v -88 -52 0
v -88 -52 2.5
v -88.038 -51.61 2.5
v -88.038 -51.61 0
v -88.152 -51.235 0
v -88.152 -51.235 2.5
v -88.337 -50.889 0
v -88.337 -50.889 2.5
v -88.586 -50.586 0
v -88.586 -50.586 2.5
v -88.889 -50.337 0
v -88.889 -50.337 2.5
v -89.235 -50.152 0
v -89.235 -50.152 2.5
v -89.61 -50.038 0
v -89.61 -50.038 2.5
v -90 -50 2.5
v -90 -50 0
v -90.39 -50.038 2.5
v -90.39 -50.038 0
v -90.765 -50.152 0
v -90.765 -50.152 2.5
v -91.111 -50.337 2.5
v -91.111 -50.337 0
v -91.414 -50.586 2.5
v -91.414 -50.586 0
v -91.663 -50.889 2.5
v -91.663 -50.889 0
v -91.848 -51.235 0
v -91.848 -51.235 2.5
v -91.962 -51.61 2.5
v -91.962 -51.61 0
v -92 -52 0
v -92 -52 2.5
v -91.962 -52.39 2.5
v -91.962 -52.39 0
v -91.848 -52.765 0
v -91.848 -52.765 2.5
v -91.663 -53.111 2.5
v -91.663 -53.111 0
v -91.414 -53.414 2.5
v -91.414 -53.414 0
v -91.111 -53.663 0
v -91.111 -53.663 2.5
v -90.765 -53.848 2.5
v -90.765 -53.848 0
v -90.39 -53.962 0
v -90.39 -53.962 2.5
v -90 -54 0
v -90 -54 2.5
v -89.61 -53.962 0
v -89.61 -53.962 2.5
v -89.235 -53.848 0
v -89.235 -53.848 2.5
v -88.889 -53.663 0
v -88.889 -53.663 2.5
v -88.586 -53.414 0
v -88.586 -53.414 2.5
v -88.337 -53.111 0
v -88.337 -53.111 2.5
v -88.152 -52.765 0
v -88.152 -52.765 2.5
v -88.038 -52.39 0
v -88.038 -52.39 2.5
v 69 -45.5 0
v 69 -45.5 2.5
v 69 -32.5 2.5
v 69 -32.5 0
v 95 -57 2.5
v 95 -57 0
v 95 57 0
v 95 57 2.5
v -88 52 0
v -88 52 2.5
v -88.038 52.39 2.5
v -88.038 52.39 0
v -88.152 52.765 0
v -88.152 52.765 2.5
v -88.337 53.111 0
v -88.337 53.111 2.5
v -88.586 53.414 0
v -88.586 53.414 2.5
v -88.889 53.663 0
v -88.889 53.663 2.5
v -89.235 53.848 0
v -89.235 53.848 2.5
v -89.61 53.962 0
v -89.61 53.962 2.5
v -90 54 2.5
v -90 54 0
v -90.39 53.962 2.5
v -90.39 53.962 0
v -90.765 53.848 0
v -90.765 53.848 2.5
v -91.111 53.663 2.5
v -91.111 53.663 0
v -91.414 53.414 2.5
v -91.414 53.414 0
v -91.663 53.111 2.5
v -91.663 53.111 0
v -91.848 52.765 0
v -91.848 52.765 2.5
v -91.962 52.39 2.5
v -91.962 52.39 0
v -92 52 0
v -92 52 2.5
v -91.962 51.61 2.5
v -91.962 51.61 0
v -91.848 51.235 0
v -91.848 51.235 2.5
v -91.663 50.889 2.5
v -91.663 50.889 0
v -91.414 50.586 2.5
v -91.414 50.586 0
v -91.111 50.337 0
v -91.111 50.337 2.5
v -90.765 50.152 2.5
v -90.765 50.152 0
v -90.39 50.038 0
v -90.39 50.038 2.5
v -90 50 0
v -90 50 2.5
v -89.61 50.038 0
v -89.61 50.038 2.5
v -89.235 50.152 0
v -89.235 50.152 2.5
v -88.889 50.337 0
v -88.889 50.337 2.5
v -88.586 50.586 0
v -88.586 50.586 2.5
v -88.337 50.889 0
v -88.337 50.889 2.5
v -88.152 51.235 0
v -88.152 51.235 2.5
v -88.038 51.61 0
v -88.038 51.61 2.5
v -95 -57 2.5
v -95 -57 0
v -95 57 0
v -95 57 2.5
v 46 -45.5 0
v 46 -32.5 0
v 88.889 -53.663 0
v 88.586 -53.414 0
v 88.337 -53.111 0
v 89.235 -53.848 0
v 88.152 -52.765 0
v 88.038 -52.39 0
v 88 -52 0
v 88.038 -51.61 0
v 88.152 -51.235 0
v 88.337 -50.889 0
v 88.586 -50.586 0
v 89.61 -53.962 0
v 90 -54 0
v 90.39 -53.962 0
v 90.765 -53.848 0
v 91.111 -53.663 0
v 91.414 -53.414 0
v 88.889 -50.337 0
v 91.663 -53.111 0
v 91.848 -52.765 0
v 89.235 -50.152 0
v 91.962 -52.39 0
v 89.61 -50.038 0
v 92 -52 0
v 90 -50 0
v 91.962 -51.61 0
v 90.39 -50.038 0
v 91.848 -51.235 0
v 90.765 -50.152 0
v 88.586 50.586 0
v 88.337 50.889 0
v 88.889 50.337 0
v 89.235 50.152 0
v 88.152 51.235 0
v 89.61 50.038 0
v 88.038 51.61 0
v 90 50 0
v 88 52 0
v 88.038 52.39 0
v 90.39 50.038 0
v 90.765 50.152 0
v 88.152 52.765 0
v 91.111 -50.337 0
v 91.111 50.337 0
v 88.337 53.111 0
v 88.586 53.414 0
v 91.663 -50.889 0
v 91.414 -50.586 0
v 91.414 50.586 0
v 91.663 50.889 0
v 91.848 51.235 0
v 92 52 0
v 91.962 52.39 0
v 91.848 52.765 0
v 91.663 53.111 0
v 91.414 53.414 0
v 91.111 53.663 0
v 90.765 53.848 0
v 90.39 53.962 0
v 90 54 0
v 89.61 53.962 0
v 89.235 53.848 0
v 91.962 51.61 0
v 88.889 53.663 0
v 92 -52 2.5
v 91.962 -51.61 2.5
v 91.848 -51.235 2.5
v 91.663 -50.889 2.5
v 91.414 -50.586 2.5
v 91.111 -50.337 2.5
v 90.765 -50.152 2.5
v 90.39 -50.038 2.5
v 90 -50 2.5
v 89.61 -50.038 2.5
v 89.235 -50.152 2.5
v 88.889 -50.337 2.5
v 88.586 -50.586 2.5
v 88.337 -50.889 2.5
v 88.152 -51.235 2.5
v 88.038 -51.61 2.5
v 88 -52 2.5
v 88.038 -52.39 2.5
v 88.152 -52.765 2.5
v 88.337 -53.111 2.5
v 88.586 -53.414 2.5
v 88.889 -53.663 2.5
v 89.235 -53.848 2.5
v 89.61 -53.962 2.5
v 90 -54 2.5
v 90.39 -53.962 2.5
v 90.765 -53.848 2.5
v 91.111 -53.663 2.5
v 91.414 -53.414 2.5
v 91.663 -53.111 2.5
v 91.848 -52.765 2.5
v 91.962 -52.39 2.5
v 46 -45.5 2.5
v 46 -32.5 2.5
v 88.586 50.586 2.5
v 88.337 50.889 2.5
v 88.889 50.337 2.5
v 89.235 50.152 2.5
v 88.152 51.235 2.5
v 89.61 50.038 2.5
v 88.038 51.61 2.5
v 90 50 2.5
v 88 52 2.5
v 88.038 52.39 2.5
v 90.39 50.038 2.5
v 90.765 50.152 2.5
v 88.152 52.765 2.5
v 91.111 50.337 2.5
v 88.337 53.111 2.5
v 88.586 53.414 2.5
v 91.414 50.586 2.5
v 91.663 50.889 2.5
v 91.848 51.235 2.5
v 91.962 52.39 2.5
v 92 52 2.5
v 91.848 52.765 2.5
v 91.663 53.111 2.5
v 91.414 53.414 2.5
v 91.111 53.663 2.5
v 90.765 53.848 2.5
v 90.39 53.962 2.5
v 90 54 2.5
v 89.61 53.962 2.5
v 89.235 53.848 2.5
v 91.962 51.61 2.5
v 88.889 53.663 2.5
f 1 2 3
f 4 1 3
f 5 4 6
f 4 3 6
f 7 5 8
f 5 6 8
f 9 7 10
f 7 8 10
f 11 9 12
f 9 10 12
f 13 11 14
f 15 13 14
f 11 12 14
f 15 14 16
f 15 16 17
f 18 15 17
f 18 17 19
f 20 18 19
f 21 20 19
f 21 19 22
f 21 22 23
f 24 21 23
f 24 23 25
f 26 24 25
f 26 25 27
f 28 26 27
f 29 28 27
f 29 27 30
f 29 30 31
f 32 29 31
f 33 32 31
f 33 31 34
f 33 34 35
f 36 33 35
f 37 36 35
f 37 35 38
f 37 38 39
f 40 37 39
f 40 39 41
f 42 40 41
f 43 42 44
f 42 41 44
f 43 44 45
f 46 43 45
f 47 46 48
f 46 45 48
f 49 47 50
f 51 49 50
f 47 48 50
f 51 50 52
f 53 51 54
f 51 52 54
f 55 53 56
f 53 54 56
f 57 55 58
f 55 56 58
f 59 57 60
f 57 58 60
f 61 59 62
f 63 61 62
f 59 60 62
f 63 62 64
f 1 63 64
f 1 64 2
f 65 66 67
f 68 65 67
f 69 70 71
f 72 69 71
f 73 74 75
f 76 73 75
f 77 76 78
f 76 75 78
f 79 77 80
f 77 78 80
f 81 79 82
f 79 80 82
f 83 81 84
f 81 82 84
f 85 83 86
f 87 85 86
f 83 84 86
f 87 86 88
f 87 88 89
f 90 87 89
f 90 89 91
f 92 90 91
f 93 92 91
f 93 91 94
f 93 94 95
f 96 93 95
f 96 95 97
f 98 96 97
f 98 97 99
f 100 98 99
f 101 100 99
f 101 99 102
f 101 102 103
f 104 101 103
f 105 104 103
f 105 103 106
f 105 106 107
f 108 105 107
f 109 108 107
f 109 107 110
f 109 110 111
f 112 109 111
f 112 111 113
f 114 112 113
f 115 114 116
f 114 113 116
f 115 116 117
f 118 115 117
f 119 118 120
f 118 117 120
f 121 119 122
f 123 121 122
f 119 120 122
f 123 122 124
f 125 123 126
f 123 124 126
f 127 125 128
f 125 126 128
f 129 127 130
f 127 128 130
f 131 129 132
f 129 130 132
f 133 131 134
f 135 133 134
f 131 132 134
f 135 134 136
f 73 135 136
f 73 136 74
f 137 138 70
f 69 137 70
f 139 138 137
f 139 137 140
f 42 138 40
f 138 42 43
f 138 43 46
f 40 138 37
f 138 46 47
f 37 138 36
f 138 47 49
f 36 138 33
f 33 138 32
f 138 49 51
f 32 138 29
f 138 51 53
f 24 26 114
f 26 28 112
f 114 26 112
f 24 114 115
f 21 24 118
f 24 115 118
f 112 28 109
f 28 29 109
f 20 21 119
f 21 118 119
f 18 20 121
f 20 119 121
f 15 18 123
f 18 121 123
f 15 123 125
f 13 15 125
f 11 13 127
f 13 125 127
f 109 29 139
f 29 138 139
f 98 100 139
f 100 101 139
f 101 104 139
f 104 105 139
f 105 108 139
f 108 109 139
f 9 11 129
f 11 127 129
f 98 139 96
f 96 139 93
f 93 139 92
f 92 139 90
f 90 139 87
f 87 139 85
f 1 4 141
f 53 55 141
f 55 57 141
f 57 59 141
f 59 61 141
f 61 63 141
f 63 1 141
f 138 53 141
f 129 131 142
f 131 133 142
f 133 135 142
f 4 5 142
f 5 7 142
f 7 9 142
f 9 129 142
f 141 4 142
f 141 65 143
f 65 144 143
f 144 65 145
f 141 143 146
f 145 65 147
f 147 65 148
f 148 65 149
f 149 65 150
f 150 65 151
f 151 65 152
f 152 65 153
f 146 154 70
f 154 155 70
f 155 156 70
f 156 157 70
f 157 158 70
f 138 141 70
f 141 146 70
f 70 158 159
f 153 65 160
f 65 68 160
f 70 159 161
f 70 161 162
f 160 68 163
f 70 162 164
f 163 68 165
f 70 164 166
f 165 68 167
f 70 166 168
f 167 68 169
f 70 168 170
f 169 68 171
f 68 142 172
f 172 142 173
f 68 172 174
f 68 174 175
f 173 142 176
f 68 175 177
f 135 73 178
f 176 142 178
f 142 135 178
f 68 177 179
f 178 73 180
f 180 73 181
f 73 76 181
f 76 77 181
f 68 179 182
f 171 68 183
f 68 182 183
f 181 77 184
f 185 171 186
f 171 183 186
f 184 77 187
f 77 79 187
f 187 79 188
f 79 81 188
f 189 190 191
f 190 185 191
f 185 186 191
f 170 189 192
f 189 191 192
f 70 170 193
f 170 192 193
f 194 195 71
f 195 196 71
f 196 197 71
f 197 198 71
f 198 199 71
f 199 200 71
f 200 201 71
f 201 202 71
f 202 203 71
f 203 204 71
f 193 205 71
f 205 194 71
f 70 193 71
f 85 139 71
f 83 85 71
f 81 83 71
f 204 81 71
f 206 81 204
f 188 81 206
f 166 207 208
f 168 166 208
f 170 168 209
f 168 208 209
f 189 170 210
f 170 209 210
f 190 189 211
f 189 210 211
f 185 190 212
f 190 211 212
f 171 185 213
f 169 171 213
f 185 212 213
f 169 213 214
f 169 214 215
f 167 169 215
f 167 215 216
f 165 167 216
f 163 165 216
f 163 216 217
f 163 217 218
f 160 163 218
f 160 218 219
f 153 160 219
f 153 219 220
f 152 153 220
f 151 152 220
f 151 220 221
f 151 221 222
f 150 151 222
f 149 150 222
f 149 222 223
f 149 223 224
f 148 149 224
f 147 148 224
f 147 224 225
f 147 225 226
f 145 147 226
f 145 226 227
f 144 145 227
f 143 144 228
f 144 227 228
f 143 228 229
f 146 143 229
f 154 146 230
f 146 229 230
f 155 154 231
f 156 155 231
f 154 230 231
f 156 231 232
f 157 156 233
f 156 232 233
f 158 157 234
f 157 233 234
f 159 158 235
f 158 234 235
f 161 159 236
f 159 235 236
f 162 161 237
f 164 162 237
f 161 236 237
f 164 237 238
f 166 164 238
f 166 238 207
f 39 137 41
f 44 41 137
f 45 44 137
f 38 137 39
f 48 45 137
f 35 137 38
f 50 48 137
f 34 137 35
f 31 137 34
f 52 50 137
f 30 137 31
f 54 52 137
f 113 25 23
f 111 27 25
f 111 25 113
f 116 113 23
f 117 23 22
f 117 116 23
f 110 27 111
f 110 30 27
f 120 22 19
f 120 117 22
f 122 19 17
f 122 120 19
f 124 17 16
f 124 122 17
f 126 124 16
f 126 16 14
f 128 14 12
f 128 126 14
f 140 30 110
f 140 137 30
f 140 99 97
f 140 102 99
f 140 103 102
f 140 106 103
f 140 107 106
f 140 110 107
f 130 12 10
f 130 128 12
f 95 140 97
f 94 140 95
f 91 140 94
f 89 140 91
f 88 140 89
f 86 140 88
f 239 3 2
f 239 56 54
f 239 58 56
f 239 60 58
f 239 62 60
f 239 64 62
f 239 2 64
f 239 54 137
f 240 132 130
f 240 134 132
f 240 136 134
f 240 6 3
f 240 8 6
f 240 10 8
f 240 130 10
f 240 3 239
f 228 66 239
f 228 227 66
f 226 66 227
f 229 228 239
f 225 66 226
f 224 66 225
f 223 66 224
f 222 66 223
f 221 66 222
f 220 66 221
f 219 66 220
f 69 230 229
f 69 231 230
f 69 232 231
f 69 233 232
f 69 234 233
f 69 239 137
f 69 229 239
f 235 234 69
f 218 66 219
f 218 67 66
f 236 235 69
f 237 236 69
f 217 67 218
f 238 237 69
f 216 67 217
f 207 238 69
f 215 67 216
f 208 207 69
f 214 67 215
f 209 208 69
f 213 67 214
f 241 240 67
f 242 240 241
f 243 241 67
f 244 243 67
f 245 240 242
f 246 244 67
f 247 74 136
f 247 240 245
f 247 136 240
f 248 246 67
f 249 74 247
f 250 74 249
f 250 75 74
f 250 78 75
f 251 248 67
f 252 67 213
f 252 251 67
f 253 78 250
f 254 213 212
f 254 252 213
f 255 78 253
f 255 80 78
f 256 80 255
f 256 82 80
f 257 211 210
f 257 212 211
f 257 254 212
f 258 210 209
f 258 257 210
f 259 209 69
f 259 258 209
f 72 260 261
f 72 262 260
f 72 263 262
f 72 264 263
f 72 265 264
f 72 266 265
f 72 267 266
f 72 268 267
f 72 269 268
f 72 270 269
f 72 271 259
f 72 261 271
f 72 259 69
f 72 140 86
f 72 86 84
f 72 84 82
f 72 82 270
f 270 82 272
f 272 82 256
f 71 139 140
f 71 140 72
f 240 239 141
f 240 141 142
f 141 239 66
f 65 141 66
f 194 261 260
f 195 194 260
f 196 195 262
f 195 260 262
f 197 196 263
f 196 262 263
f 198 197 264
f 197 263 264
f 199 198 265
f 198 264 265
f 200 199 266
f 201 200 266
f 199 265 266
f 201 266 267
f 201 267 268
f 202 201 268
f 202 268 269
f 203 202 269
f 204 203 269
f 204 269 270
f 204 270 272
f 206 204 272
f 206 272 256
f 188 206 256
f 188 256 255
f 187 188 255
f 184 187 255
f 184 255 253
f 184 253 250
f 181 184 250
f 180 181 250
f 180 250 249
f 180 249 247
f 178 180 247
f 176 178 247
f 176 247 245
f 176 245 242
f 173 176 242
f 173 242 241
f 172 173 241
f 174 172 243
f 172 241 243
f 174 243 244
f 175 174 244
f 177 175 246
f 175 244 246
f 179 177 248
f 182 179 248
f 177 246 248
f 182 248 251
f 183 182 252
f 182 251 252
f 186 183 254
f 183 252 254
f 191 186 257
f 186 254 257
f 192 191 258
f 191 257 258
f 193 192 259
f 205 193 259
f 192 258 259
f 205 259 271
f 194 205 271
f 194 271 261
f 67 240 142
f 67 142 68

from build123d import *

# Parameters (mm, degrees)
SKETCH1_W           = 190
SKETCH1_H           = 114
BOSS_EXTRUDE1_DEPTH = 2.5
SKETCH3_R           = 2
CUT_EXTRUDE2_DEPTH  = 10
SKETCH4_W           = 23
SKETCH4_H           = 13
CUT_EXTRUDE3_DEPTH  = 21


with BuildPart() as part:
    # Sketch1 → Boss-Extrude1 (new body)
    with BuildSketch(Plane.XY):
        Rectangle(SKETCH1_W, SKETCH1_H)
    extrude(amount=BOSS_EXTRUDE1_DEPTH)

    # Sketch3 → Cut-Extrude2 (cut)
    with BuildSketch(Plane.XY.offset(2.5)):
        with Locations((-90, 52)):
            Circle(SKETCH3_R)
        with Locations((90, 52)):
            Circle(SKETCH3_R)
        with Locations((90, -52)):
            Circle(SKETCH3_R)
        with Locations((-90, -52)):
            Circle(SKETCH3_R)
    extrude(amount=-CUT_EXTRUDE2_DEPTH, mode=Mode.SUBTRACT)

    # Sketch4 → Cut-Extrude3 (cut)
    with BuildSketch(Plane.XY.offset(2.5)):
        with Locations((57.5, -39)):
            Rectangle(SKETCH4_W, SKETCH4_H)
    extrude(amount=-CUT_EXTRUDE3_DEPTH, mode=Mode.SUBTRACT)


solid = part.part
